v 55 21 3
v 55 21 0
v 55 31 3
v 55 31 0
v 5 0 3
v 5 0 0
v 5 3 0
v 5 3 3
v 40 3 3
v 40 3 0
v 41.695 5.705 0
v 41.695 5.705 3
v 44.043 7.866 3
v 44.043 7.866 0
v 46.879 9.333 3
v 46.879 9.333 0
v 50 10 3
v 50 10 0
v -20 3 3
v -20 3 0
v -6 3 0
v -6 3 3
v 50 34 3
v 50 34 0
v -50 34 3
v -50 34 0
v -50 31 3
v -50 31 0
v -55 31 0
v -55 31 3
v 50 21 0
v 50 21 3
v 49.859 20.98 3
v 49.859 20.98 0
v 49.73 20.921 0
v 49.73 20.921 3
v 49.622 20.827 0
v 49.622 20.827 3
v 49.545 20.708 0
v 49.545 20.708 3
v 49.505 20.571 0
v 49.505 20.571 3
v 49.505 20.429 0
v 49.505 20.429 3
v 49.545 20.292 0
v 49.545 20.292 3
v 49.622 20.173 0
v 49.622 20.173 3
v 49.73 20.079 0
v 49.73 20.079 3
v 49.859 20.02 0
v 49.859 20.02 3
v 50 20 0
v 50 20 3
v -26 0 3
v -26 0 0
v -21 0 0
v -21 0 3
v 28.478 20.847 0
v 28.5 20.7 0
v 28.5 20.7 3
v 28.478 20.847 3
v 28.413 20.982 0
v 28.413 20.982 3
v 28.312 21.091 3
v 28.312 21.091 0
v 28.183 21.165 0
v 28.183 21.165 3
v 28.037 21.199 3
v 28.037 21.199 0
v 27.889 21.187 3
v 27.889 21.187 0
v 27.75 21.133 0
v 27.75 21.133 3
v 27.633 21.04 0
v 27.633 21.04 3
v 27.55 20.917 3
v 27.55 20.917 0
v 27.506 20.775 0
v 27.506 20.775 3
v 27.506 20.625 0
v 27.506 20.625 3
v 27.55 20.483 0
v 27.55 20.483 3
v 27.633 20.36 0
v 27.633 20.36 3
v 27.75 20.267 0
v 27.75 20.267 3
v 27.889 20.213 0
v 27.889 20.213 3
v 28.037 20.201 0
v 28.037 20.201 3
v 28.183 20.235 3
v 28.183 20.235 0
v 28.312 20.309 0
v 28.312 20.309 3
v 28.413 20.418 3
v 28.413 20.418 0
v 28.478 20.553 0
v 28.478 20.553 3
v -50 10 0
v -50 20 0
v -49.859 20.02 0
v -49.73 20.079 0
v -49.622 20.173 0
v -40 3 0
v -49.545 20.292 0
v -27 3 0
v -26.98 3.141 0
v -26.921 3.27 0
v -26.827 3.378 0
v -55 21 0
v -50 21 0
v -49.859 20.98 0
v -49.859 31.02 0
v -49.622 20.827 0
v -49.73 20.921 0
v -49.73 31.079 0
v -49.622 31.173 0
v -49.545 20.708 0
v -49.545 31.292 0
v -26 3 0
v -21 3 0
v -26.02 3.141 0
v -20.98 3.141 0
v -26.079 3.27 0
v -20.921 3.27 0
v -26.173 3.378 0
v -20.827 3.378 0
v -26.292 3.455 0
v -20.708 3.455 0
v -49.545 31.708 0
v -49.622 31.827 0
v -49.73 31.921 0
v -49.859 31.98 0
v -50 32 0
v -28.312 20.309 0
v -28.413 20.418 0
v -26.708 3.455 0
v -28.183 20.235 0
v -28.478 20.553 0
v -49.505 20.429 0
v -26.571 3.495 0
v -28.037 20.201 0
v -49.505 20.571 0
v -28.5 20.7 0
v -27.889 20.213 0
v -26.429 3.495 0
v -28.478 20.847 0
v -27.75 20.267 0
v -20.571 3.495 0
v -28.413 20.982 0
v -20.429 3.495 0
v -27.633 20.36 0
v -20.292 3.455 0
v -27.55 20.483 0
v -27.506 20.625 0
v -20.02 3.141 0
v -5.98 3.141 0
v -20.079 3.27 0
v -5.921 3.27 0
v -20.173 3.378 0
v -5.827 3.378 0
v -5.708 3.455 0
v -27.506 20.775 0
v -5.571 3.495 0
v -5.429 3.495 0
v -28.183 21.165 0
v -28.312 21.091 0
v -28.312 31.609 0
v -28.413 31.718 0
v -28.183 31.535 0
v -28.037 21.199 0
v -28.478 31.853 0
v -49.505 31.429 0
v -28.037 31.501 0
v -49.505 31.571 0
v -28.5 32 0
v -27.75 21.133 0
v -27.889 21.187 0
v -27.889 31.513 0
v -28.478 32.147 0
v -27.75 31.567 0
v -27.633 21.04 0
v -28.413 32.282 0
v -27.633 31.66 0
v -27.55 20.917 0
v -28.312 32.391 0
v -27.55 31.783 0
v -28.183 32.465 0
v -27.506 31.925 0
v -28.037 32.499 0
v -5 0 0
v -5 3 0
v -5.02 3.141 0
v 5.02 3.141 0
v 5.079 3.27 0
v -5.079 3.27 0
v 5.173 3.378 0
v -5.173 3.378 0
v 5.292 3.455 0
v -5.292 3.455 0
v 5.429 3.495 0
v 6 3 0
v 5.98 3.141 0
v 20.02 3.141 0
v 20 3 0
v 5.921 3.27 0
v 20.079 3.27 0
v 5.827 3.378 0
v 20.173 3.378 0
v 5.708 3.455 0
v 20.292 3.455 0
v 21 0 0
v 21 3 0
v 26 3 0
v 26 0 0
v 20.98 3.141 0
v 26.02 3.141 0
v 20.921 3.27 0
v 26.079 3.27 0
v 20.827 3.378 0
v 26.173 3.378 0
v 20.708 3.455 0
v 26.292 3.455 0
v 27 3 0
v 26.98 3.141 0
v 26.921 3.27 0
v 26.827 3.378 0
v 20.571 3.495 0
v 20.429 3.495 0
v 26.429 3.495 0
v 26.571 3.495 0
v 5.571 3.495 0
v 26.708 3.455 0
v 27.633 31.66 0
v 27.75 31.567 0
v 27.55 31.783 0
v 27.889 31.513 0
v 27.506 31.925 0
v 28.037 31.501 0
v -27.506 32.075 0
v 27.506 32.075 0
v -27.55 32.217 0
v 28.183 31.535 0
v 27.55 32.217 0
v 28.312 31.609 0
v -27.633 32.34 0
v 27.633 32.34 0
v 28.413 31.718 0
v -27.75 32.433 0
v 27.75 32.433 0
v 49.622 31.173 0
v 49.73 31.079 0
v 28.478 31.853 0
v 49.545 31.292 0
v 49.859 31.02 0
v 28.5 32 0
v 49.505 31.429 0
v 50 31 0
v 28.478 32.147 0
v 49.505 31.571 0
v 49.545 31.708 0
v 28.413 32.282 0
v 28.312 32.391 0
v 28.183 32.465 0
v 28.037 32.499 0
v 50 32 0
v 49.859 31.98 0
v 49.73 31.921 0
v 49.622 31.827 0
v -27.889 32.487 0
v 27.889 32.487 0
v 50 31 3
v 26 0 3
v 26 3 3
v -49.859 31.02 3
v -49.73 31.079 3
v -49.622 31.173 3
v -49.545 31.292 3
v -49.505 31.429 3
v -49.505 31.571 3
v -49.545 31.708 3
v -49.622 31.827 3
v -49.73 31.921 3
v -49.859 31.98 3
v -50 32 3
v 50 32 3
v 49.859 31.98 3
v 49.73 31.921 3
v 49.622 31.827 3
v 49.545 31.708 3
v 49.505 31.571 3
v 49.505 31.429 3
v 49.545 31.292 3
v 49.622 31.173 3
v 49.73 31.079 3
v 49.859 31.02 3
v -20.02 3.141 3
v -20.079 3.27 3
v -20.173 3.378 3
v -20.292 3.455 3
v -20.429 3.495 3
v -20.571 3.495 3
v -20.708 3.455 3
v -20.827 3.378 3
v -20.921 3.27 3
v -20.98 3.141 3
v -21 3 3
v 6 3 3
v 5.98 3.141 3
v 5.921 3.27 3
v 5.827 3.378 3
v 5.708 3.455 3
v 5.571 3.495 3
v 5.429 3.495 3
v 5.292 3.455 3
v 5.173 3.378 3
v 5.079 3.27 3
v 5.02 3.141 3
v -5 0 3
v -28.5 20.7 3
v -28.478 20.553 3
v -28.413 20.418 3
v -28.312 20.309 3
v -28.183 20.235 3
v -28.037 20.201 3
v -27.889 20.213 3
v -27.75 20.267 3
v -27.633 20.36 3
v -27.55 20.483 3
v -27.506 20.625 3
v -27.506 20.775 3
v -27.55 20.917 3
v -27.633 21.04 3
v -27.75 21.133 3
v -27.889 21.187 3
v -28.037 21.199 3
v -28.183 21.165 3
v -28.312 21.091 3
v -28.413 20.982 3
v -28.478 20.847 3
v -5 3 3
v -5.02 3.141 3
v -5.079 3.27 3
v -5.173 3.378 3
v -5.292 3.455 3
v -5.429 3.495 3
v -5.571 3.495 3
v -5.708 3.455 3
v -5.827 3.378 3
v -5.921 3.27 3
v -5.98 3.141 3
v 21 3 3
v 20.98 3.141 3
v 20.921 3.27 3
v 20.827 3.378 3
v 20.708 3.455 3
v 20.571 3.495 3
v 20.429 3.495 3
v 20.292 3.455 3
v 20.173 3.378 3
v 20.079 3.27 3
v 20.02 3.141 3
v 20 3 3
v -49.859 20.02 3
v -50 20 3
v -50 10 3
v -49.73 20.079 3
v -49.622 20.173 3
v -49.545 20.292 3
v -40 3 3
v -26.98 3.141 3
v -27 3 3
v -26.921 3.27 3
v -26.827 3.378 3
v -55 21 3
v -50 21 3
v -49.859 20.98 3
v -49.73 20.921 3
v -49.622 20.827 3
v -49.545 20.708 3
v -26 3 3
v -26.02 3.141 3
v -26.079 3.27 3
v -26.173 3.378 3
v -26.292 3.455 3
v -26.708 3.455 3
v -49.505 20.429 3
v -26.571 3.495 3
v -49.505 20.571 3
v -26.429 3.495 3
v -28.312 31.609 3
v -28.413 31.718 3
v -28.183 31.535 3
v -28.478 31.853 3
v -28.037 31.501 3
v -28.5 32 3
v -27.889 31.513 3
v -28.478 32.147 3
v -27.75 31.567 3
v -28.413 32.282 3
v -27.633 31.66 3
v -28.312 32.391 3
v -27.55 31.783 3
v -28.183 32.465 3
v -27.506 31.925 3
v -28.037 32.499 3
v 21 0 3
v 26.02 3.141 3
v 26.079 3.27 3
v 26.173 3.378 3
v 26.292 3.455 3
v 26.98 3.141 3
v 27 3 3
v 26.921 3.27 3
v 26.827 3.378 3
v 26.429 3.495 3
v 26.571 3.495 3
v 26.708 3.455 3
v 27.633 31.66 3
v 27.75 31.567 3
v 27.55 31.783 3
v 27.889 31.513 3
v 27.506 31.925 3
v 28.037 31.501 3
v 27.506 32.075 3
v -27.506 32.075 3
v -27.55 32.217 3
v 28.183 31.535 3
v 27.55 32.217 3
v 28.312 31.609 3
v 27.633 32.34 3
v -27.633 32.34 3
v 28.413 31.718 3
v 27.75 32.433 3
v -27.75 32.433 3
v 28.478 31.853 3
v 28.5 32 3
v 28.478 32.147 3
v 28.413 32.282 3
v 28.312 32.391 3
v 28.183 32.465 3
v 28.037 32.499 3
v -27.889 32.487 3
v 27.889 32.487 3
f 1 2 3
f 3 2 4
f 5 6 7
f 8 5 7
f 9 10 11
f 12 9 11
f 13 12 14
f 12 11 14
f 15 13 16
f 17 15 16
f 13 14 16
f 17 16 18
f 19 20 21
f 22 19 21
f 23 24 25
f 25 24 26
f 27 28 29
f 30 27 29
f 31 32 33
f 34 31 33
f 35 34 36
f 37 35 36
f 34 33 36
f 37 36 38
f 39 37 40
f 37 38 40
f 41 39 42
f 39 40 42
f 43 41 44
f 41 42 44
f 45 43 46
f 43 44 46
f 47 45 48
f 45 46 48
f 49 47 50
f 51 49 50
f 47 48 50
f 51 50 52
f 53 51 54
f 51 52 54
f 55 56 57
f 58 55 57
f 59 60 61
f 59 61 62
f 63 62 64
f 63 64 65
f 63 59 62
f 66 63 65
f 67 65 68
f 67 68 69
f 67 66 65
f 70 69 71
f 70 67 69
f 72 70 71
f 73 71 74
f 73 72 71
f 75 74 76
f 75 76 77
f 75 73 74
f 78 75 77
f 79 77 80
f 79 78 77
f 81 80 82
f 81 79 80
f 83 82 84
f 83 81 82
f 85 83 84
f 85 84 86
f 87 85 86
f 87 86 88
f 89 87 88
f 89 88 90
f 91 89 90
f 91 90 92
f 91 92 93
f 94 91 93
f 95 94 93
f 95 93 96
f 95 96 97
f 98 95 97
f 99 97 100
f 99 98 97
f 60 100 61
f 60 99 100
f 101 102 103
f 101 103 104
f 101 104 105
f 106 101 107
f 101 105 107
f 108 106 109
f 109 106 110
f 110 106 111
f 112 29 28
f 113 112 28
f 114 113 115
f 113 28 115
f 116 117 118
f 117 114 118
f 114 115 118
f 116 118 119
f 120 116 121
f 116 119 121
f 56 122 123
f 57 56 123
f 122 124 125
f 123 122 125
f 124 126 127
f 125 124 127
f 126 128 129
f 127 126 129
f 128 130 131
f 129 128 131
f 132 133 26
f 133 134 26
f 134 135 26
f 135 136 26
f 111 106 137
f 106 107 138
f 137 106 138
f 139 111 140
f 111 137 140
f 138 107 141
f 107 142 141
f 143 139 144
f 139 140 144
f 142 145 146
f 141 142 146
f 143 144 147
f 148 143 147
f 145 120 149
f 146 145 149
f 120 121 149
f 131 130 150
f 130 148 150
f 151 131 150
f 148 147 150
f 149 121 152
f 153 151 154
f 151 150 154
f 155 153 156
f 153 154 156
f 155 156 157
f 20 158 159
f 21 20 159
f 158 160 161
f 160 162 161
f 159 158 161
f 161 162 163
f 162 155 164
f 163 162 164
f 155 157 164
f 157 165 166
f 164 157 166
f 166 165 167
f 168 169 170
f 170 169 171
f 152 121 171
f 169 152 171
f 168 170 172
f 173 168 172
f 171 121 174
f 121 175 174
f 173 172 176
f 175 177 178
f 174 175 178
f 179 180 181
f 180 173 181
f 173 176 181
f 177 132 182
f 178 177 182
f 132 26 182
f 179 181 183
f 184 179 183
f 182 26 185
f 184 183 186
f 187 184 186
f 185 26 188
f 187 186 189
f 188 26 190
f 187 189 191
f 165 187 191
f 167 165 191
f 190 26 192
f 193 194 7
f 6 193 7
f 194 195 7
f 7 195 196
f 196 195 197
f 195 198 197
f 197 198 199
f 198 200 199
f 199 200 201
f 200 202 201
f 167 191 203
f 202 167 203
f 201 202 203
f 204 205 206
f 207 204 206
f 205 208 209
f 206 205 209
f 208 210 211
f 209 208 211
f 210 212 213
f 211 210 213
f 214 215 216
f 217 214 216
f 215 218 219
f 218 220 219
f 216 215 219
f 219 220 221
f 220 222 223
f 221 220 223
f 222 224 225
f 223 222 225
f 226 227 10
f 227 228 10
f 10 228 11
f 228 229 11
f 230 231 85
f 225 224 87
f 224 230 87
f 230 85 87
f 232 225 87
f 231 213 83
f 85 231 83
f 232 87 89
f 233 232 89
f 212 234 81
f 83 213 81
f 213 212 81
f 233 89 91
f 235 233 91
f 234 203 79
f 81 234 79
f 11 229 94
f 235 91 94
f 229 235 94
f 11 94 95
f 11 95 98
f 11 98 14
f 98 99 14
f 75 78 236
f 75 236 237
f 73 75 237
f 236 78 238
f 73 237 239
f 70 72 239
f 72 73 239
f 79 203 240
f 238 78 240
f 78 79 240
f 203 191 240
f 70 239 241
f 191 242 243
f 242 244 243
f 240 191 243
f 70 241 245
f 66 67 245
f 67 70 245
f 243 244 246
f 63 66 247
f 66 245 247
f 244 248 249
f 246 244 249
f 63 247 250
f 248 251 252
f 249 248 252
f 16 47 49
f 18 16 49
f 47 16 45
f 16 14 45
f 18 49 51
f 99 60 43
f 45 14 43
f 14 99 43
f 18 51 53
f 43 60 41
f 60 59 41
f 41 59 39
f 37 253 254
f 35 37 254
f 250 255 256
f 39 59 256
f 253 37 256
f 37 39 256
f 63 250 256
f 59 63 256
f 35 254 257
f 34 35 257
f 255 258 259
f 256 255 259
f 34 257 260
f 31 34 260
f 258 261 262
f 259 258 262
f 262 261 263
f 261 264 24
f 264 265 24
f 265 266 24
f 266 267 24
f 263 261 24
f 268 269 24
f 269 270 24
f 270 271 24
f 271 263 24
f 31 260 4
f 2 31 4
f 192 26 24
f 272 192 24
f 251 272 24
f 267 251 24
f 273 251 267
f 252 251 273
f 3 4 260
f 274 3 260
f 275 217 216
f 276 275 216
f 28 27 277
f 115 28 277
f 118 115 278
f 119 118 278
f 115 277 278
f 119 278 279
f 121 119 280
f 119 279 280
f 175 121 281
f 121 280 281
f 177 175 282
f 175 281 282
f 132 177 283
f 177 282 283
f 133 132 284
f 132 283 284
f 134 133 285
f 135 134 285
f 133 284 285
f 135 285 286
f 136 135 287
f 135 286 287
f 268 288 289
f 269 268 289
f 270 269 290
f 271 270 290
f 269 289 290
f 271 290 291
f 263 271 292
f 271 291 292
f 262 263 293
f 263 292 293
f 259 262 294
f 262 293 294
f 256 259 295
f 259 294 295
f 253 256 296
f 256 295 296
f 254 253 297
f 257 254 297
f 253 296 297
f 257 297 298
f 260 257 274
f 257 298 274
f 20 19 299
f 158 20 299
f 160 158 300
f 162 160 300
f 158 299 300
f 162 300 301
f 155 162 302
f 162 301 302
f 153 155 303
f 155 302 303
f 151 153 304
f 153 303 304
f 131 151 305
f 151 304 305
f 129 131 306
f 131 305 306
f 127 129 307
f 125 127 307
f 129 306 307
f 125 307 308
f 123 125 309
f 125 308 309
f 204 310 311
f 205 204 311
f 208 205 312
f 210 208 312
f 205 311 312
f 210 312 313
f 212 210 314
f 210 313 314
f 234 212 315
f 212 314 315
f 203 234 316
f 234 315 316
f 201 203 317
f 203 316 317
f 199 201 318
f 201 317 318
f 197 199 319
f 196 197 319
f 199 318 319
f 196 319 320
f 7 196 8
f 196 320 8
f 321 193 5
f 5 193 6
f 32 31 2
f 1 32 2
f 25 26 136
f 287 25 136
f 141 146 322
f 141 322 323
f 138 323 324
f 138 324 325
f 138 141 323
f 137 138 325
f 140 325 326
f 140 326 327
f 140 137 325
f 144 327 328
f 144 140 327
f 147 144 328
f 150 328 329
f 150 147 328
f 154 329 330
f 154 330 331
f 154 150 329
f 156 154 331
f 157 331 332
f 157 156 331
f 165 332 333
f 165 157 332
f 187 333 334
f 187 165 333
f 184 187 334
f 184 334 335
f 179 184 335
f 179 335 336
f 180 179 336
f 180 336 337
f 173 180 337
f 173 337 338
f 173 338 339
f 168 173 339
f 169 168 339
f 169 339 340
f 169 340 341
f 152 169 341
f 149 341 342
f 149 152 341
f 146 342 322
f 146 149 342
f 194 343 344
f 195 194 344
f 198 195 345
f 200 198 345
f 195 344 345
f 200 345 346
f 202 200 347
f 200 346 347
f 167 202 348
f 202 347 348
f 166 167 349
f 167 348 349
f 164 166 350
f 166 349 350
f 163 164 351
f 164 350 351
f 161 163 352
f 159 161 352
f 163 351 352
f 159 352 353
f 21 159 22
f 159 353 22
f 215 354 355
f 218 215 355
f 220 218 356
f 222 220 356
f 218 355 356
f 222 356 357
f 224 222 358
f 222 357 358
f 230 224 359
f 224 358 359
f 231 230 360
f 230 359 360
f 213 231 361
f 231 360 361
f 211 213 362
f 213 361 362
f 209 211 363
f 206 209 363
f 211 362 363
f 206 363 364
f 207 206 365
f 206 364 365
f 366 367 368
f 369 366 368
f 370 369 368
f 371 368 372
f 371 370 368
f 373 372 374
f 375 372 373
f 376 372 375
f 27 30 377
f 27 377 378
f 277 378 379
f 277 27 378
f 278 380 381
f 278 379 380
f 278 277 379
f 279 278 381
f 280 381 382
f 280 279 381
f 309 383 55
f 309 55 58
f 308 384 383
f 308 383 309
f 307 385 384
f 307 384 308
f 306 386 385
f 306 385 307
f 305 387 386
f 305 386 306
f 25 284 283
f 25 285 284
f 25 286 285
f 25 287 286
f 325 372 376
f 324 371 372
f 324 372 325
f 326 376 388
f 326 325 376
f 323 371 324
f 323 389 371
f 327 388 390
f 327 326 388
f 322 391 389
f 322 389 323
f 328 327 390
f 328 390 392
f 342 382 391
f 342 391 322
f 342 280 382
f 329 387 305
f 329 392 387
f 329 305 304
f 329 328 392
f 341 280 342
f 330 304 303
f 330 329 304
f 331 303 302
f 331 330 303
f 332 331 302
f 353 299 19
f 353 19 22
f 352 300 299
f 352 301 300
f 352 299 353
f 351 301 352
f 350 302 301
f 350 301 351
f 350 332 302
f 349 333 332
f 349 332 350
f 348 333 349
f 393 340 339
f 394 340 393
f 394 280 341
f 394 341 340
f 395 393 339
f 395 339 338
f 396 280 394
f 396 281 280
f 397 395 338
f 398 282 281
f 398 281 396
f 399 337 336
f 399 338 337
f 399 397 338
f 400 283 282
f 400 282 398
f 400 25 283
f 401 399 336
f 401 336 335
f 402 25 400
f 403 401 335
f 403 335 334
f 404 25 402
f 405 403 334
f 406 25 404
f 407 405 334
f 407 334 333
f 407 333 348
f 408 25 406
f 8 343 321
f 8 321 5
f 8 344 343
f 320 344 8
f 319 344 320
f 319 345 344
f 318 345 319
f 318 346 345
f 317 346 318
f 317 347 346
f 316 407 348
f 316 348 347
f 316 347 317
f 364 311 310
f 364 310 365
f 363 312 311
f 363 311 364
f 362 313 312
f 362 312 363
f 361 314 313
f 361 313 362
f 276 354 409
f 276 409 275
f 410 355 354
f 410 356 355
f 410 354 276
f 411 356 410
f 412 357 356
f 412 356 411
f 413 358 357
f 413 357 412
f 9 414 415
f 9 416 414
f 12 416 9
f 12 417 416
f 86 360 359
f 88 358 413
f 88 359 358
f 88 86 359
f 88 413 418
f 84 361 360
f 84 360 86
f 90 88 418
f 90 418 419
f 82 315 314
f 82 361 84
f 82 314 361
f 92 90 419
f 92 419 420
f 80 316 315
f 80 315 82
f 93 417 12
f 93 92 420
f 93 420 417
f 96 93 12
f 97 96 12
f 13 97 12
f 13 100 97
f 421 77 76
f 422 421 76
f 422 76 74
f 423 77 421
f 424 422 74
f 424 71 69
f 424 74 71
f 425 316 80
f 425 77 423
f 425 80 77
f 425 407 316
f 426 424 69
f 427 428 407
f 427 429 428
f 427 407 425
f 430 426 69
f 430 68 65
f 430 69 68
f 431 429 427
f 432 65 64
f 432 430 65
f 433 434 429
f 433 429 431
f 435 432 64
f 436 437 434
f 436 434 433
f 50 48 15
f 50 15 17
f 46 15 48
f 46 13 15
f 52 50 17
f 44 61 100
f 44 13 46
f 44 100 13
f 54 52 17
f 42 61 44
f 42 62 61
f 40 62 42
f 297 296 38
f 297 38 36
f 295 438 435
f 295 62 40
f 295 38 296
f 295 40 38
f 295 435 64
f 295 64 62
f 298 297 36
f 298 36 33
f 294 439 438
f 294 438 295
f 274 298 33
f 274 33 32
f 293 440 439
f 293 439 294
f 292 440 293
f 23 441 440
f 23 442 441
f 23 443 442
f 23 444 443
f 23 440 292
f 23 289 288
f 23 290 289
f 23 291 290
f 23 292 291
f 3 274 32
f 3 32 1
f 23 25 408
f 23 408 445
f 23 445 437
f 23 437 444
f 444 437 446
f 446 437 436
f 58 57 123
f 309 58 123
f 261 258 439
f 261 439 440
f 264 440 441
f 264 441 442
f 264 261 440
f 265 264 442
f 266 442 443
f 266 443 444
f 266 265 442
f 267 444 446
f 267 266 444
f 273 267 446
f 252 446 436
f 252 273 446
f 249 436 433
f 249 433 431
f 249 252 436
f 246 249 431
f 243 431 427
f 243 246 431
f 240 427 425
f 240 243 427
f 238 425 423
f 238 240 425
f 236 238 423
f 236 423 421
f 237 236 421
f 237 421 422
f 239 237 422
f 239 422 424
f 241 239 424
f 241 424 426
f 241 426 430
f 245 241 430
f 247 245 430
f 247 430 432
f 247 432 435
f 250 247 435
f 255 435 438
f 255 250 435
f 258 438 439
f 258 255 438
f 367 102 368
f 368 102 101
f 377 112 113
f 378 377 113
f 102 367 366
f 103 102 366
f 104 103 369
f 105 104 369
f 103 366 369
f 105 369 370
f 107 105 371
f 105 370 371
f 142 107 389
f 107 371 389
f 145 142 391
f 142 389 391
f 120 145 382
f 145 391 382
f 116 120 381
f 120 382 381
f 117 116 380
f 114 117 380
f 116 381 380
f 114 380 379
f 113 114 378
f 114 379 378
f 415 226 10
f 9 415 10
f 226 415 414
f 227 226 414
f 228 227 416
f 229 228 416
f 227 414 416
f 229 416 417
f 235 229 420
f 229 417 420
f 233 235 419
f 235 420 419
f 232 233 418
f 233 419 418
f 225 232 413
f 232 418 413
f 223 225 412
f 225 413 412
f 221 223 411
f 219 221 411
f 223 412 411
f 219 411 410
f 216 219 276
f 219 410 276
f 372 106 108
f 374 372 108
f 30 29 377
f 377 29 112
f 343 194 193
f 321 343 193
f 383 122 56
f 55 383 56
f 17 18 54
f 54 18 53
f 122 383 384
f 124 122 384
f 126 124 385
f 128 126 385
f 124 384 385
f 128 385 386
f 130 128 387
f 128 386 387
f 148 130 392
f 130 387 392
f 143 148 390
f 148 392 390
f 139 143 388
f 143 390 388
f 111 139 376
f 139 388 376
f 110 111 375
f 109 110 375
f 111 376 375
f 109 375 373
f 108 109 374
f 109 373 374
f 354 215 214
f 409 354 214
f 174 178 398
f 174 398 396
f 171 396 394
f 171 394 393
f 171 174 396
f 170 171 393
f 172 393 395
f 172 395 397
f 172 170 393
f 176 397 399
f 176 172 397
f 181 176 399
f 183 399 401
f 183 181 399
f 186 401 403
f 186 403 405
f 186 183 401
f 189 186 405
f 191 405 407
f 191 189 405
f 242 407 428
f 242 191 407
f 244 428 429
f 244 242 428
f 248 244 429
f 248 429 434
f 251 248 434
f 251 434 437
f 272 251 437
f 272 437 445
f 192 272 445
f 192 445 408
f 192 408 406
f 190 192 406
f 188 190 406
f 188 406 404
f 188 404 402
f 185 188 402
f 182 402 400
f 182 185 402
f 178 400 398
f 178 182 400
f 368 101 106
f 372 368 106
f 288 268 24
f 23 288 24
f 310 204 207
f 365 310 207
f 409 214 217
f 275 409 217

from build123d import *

# Parameters (mm, degrees)
SKETCH1_R           = 0.5
BOSS_EXTRUDE1_DEPTH = 3
CUT_EXTRUDE2_DEPTH  = 65.730209331


with BuildPart() as part:
    # Sketch1 → Boss-Extrude1 (new body)
    with BuildSketch(Plane.XY):
        with BuildLine():
            Line((-5, 0), (5, 0))
            Line((5, 0), (5, 3))
            Line((5, 3), (21, 3))
            Line((21, 3), (21, 0))
            Line((21, 0), (26, 0))
            Line((26, 0), (26, 3))
            Line((26, 3), (40, 3))
            ThreePointArc((40, 3), (44.043458593, 7.866487724), (50, 10))
            Line((50, 10), (50, 21))
            Line((50, 21), (55, 21))
            Line((55, 21), (55, 31))
            Line((55, 31), (50, 31))
            Line((50, 31), (50, 34))
            Line((50, 34), (0, 34))
            Line((0, 34), (-50, 34))
            Line((-50, 34), (-50, 31))
            Line((-50, 31), (-55, 31))
            Line((-55, 31), (-55, 21))
            Line((-55, 21), (-50, 21))
            Line((-50, 21), (-50, 10))
            Line((-50, 10), (-40, 3))
            Line((-40, 3), (-26, 3))
            Line((-26, 3), (-26, 0))
            Line((-26, 0), (-21, 0))
            Line((-21, 0), (-21, 3))
            Line((-21, 3), (-5, 3))
            Line((-5, 3), (-5, 0))
        make_face()
        with Locations((28, 32)):
            Circle(SKETCH1_R, mode=Mode.SUBTRACT)
        with Locations((28, 20.7)):
            Circle(SKETCH1_R, mode=Mode.SUBTRACT)
        with Locations(Location((-28, 20.7, 0), (0, 0, 180))):
            Circle(SKETCH1_R, mode=Mode.SUBTRACT)
        with Locations(Location((-28, 32, 0), (0, 0, 180))):
            Circle(SKETCH1_R, mode=Mode.SUBTRACT)
    extrude(amount=BOSS_EXTRUDE1_DEPTH)

    # Sketch3 → Cut-Extrude2 (cut, through all)
    with BuildSketch(Plane.XY.offset(3)):
        with BuildLine():
            Line((-50, 32), (-50, 31))
            ThreePointArc((-50, 31), (-49.5, 31.5), (-50, 32))
        make_face()
        with BuildLine():
            ThreePointArc((-50, 20), (-49.5, 20.5), (-50, 21))
            Line((-50, 21), (-50, 20))
        make_face()
        with BuildLine():
            Line((-27, 3), (-26, 3))
            ThreePointArc((-26, 3), (-26.5, 3.5), (-27, 3))
        make_face()
        with BuildLine():
            ThreePointArc((-20, 3), (-20.5, 3.5), (-21, 3))
            Line((-21, 3), (-20, 3))
        make_face()
        with BuildLine():
            ThreePointArc((-5, 3), (-5.5, 3.5), (-6, 3))
            Line((-6, 3), (-5, 3))
        make_face()
        with BuildLine():
            ThreePointArc((6, 3), (5.5, 3.5), (5, 3))
            Line((5, 3), (6, 3))
        make_face()
        with BuildLine():
            ThreePointArc((21, 3), (20.5, 3.5), (20, 3))
            Line((20, 3), (21, 3))
        make_face()
        with BuildLine():
            ThreePointArc((27, 3), (26.5, 3.5), (26, 3))
            Line((26, 3), (27, 3))
        make_face()
        with BuildLine():
            Line((50, 20), (50, 21))
            ThreePointArc((50, 21), (49.5, 20.5), (50, 20))
        make_face()
        with BuildLine():
            ThreePointArc((50, 32), (49.5, 31.5), (50, 31))
            Line((50, 31), (50, 32))
        make_face()
    extrude(amount=-CUT_EXTRUDE2_DEPTH, mode=Mode.SUBTRACT)


solid = part.part
